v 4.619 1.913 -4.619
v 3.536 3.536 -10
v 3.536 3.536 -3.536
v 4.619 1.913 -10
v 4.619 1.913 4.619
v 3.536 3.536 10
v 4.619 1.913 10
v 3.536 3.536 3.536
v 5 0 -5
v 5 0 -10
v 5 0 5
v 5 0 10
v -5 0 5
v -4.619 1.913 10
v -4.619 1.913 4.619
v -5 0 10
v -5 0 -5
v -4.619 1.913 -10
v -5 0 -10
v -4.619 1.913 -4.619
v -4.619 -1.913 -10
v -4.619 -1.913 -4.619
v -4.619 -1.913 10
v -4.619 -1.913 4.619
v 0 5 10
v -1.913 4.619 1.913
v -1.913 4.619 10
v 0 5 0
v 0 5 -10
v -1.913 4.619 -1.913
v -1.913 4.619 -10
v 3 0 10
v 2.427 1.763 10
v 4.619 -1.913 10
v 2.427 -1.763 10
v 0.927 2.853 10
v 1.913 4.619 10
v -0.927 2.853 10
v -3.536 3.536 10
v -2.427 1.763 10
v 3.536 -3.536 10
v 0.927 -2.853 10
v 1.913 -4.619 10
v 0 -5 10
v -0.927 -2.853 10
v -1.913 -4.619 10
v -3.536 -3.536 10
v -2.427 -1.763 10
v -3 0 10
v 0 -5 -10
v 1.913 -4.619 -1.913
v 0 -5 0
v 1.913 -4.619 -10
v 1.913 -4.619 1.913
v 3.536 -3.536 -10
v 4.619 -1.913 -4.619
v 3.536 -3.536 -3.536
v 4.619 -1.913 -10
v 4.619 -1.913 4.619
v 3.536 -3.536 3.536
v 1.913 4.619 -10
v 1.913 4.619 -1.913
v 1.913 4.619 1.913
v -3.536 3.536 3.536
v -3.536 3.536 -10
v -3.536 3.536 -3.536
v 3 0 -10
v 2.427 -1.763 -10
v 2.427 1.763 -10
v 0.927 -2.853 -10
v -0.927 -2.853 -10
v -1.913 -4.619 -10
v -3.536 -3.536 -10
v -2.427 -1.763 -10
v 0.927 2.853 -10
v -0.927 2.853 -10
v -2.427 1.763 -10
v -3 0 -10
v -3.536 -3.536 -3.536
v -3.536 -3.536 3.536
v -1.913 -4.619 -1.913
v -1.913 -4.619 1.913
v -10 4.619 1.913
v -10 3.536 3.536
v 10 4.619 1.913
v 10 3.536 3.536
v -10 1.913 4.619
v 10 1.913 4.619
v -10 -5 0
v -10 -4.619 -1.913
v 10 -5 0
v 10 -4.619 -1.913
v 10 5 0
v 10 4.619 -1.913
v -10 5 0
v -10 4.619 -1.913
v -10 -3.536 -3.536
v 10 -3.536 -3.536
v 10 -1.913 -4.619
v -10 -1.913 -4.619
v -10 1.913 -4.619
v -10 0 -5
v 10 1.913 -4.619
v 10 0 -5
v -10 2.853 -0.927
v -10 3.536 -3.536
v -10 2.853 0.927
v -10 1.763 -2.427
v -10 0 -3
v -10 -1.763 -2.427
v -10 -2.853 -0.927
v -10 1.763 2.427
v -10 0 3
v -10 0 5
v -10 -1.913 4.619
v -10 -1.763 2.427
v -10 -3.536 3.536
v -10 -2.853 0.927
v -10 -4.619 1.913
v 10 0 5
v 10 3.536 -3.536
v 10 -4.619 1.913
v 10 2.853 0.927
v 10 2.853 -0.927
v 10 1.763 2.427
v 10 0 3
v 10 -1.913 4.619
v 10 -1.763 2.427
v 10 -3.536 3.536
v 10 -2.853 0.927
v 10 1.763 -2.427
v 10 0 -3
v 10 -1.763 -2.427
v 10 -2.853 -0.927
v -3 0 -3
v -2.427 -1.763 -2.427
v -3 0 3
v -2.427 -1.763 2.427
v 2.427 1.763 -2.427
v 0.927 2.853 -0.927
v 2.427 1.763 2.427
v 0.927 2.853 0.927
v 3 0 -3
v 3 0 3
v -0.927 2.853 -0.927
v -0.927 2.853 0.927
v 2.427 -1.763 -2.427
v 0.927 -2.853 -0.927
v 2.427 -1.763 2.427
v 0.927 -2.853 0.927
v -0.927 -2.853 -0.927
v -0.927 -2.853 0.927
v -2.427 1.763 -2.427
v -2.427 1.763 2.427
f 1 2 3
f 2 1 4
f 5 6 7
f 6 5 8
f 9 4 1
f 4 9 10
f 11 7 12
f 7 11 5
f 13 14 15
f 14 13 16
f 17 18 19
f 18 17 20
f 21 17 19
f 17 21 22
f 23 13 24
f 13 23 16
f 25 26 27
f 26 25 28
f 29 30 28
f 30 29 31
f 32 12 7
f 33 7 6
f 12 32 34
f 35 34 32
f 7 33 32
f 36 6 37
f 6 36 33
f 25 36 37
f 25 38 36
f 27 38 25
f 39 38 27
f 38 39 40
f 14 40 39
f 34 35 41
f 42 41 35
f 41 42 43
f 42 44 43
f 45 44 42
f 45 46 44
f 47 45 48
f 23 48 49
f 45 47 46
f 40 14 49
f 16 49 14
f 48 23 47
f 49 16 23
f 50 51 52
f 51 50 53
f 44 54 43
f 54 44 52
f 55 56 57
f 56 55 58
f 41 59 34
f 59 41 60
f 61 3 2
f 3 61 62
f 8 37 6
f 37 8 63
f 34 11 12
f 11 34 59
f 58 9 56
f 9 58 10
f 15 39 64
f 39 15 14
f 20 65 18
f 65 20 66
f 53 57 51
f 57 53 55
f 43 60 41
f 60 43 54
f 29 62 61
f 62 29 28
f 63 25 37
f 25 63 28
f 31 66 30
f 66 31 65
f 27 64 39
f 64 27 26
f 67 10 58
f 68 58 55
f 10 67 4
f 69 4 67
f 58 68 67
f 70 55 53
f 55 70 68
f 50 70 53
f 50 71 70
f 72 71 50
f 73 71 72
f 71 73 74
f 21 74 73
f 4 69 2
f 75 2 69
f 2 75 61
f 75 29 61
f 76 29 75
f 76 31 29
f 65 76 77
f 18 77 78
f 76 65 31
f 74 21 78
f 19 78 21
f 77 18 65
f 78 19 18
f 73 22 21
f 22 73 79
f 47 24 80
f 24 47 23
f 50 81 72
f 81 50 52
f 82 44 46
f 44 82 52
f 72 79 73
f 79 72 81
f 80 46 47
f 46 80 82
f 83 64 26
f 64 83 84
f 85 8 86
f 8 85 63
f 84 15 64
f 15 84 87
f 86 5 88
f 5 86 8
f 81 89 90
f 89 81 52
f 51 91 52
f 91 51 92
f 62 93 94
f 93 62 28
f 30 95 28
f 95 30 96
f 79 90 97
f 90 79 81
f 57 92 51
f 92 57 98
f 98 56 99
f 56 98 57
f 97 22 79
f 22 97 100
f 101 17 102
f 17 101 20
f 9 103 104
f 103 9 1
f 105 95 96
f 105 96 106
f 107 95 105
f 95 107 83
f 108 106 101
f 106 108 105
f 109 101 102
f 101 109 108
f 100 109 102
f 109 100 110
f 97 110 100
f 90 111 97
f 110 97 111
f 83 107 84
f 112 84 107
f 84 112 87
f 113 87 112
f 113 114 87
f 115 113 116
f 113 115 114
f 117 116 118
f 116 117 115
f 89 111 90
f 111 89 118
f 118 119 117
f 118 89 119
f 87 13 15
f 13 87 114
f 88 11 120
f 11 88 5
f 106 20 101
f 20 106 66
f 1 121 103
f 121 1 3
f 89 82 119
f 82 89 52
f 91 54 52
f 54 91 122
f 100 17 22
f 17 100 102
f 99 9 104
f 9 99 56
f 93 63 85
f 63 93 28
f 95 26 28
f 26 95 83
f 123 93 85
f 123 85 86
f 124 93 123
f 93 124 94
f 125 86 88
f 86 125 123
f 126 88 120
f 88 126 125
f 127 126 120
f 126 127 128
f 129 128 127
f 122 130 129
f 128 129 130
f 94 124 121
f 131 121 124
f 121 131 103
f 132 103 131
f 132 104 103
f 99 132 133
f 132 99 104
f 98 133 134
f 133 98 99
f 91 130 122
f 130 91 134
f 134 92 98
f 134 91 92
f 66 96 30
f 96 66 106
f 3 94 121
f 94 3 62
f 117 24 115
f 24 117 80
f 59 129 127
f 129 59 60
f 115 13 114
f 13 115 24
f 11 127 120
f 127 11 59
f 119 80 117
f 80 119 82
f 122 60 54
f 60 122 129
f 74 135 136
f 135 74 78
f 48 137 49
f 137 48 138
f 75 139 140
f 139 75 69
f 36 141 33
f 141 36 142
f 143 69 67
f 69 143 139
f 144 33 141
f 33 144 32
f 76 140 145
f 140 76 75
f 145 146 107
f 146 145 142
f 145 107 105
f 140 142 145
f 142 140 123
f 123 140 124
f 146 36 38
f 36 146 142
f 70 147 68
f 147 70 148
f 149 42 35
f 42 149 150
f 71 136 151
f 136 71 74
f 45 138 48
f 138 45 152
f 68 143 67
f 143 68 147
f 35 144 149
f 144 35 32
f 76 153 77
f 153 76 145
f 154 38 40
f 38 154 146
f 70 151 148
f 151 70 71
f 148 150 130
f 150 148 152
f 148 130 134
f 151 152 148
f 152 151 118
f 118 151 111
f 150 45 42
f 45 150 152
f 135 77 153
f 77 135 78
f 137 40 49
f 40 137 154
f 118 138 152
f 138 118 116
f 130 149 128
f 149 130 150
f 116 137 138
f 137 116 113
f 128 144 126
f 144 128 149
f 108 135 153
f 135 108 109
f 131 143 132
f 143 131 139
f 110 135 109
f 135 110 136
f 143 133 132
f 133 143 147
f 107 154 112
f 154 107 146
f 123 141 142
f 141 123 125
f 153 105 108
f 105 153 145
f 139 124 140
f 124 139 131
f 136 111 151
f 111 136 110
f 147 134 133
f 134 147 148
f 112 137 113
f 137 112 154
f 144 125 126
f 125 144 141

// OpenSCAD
// pipe 


difference() {
    
    union() {
        cylinder(h = 20, r = 5, center = true);
        rotate([0,90,0]) cylinder(h = 20, r = 5, center = true);
    }

    #union() {
        cylinder(h = 30, r = 3, center = true);
        rotate([0,90,0]) cylinder(h = 30, r = 3, center = true);
    }

}
